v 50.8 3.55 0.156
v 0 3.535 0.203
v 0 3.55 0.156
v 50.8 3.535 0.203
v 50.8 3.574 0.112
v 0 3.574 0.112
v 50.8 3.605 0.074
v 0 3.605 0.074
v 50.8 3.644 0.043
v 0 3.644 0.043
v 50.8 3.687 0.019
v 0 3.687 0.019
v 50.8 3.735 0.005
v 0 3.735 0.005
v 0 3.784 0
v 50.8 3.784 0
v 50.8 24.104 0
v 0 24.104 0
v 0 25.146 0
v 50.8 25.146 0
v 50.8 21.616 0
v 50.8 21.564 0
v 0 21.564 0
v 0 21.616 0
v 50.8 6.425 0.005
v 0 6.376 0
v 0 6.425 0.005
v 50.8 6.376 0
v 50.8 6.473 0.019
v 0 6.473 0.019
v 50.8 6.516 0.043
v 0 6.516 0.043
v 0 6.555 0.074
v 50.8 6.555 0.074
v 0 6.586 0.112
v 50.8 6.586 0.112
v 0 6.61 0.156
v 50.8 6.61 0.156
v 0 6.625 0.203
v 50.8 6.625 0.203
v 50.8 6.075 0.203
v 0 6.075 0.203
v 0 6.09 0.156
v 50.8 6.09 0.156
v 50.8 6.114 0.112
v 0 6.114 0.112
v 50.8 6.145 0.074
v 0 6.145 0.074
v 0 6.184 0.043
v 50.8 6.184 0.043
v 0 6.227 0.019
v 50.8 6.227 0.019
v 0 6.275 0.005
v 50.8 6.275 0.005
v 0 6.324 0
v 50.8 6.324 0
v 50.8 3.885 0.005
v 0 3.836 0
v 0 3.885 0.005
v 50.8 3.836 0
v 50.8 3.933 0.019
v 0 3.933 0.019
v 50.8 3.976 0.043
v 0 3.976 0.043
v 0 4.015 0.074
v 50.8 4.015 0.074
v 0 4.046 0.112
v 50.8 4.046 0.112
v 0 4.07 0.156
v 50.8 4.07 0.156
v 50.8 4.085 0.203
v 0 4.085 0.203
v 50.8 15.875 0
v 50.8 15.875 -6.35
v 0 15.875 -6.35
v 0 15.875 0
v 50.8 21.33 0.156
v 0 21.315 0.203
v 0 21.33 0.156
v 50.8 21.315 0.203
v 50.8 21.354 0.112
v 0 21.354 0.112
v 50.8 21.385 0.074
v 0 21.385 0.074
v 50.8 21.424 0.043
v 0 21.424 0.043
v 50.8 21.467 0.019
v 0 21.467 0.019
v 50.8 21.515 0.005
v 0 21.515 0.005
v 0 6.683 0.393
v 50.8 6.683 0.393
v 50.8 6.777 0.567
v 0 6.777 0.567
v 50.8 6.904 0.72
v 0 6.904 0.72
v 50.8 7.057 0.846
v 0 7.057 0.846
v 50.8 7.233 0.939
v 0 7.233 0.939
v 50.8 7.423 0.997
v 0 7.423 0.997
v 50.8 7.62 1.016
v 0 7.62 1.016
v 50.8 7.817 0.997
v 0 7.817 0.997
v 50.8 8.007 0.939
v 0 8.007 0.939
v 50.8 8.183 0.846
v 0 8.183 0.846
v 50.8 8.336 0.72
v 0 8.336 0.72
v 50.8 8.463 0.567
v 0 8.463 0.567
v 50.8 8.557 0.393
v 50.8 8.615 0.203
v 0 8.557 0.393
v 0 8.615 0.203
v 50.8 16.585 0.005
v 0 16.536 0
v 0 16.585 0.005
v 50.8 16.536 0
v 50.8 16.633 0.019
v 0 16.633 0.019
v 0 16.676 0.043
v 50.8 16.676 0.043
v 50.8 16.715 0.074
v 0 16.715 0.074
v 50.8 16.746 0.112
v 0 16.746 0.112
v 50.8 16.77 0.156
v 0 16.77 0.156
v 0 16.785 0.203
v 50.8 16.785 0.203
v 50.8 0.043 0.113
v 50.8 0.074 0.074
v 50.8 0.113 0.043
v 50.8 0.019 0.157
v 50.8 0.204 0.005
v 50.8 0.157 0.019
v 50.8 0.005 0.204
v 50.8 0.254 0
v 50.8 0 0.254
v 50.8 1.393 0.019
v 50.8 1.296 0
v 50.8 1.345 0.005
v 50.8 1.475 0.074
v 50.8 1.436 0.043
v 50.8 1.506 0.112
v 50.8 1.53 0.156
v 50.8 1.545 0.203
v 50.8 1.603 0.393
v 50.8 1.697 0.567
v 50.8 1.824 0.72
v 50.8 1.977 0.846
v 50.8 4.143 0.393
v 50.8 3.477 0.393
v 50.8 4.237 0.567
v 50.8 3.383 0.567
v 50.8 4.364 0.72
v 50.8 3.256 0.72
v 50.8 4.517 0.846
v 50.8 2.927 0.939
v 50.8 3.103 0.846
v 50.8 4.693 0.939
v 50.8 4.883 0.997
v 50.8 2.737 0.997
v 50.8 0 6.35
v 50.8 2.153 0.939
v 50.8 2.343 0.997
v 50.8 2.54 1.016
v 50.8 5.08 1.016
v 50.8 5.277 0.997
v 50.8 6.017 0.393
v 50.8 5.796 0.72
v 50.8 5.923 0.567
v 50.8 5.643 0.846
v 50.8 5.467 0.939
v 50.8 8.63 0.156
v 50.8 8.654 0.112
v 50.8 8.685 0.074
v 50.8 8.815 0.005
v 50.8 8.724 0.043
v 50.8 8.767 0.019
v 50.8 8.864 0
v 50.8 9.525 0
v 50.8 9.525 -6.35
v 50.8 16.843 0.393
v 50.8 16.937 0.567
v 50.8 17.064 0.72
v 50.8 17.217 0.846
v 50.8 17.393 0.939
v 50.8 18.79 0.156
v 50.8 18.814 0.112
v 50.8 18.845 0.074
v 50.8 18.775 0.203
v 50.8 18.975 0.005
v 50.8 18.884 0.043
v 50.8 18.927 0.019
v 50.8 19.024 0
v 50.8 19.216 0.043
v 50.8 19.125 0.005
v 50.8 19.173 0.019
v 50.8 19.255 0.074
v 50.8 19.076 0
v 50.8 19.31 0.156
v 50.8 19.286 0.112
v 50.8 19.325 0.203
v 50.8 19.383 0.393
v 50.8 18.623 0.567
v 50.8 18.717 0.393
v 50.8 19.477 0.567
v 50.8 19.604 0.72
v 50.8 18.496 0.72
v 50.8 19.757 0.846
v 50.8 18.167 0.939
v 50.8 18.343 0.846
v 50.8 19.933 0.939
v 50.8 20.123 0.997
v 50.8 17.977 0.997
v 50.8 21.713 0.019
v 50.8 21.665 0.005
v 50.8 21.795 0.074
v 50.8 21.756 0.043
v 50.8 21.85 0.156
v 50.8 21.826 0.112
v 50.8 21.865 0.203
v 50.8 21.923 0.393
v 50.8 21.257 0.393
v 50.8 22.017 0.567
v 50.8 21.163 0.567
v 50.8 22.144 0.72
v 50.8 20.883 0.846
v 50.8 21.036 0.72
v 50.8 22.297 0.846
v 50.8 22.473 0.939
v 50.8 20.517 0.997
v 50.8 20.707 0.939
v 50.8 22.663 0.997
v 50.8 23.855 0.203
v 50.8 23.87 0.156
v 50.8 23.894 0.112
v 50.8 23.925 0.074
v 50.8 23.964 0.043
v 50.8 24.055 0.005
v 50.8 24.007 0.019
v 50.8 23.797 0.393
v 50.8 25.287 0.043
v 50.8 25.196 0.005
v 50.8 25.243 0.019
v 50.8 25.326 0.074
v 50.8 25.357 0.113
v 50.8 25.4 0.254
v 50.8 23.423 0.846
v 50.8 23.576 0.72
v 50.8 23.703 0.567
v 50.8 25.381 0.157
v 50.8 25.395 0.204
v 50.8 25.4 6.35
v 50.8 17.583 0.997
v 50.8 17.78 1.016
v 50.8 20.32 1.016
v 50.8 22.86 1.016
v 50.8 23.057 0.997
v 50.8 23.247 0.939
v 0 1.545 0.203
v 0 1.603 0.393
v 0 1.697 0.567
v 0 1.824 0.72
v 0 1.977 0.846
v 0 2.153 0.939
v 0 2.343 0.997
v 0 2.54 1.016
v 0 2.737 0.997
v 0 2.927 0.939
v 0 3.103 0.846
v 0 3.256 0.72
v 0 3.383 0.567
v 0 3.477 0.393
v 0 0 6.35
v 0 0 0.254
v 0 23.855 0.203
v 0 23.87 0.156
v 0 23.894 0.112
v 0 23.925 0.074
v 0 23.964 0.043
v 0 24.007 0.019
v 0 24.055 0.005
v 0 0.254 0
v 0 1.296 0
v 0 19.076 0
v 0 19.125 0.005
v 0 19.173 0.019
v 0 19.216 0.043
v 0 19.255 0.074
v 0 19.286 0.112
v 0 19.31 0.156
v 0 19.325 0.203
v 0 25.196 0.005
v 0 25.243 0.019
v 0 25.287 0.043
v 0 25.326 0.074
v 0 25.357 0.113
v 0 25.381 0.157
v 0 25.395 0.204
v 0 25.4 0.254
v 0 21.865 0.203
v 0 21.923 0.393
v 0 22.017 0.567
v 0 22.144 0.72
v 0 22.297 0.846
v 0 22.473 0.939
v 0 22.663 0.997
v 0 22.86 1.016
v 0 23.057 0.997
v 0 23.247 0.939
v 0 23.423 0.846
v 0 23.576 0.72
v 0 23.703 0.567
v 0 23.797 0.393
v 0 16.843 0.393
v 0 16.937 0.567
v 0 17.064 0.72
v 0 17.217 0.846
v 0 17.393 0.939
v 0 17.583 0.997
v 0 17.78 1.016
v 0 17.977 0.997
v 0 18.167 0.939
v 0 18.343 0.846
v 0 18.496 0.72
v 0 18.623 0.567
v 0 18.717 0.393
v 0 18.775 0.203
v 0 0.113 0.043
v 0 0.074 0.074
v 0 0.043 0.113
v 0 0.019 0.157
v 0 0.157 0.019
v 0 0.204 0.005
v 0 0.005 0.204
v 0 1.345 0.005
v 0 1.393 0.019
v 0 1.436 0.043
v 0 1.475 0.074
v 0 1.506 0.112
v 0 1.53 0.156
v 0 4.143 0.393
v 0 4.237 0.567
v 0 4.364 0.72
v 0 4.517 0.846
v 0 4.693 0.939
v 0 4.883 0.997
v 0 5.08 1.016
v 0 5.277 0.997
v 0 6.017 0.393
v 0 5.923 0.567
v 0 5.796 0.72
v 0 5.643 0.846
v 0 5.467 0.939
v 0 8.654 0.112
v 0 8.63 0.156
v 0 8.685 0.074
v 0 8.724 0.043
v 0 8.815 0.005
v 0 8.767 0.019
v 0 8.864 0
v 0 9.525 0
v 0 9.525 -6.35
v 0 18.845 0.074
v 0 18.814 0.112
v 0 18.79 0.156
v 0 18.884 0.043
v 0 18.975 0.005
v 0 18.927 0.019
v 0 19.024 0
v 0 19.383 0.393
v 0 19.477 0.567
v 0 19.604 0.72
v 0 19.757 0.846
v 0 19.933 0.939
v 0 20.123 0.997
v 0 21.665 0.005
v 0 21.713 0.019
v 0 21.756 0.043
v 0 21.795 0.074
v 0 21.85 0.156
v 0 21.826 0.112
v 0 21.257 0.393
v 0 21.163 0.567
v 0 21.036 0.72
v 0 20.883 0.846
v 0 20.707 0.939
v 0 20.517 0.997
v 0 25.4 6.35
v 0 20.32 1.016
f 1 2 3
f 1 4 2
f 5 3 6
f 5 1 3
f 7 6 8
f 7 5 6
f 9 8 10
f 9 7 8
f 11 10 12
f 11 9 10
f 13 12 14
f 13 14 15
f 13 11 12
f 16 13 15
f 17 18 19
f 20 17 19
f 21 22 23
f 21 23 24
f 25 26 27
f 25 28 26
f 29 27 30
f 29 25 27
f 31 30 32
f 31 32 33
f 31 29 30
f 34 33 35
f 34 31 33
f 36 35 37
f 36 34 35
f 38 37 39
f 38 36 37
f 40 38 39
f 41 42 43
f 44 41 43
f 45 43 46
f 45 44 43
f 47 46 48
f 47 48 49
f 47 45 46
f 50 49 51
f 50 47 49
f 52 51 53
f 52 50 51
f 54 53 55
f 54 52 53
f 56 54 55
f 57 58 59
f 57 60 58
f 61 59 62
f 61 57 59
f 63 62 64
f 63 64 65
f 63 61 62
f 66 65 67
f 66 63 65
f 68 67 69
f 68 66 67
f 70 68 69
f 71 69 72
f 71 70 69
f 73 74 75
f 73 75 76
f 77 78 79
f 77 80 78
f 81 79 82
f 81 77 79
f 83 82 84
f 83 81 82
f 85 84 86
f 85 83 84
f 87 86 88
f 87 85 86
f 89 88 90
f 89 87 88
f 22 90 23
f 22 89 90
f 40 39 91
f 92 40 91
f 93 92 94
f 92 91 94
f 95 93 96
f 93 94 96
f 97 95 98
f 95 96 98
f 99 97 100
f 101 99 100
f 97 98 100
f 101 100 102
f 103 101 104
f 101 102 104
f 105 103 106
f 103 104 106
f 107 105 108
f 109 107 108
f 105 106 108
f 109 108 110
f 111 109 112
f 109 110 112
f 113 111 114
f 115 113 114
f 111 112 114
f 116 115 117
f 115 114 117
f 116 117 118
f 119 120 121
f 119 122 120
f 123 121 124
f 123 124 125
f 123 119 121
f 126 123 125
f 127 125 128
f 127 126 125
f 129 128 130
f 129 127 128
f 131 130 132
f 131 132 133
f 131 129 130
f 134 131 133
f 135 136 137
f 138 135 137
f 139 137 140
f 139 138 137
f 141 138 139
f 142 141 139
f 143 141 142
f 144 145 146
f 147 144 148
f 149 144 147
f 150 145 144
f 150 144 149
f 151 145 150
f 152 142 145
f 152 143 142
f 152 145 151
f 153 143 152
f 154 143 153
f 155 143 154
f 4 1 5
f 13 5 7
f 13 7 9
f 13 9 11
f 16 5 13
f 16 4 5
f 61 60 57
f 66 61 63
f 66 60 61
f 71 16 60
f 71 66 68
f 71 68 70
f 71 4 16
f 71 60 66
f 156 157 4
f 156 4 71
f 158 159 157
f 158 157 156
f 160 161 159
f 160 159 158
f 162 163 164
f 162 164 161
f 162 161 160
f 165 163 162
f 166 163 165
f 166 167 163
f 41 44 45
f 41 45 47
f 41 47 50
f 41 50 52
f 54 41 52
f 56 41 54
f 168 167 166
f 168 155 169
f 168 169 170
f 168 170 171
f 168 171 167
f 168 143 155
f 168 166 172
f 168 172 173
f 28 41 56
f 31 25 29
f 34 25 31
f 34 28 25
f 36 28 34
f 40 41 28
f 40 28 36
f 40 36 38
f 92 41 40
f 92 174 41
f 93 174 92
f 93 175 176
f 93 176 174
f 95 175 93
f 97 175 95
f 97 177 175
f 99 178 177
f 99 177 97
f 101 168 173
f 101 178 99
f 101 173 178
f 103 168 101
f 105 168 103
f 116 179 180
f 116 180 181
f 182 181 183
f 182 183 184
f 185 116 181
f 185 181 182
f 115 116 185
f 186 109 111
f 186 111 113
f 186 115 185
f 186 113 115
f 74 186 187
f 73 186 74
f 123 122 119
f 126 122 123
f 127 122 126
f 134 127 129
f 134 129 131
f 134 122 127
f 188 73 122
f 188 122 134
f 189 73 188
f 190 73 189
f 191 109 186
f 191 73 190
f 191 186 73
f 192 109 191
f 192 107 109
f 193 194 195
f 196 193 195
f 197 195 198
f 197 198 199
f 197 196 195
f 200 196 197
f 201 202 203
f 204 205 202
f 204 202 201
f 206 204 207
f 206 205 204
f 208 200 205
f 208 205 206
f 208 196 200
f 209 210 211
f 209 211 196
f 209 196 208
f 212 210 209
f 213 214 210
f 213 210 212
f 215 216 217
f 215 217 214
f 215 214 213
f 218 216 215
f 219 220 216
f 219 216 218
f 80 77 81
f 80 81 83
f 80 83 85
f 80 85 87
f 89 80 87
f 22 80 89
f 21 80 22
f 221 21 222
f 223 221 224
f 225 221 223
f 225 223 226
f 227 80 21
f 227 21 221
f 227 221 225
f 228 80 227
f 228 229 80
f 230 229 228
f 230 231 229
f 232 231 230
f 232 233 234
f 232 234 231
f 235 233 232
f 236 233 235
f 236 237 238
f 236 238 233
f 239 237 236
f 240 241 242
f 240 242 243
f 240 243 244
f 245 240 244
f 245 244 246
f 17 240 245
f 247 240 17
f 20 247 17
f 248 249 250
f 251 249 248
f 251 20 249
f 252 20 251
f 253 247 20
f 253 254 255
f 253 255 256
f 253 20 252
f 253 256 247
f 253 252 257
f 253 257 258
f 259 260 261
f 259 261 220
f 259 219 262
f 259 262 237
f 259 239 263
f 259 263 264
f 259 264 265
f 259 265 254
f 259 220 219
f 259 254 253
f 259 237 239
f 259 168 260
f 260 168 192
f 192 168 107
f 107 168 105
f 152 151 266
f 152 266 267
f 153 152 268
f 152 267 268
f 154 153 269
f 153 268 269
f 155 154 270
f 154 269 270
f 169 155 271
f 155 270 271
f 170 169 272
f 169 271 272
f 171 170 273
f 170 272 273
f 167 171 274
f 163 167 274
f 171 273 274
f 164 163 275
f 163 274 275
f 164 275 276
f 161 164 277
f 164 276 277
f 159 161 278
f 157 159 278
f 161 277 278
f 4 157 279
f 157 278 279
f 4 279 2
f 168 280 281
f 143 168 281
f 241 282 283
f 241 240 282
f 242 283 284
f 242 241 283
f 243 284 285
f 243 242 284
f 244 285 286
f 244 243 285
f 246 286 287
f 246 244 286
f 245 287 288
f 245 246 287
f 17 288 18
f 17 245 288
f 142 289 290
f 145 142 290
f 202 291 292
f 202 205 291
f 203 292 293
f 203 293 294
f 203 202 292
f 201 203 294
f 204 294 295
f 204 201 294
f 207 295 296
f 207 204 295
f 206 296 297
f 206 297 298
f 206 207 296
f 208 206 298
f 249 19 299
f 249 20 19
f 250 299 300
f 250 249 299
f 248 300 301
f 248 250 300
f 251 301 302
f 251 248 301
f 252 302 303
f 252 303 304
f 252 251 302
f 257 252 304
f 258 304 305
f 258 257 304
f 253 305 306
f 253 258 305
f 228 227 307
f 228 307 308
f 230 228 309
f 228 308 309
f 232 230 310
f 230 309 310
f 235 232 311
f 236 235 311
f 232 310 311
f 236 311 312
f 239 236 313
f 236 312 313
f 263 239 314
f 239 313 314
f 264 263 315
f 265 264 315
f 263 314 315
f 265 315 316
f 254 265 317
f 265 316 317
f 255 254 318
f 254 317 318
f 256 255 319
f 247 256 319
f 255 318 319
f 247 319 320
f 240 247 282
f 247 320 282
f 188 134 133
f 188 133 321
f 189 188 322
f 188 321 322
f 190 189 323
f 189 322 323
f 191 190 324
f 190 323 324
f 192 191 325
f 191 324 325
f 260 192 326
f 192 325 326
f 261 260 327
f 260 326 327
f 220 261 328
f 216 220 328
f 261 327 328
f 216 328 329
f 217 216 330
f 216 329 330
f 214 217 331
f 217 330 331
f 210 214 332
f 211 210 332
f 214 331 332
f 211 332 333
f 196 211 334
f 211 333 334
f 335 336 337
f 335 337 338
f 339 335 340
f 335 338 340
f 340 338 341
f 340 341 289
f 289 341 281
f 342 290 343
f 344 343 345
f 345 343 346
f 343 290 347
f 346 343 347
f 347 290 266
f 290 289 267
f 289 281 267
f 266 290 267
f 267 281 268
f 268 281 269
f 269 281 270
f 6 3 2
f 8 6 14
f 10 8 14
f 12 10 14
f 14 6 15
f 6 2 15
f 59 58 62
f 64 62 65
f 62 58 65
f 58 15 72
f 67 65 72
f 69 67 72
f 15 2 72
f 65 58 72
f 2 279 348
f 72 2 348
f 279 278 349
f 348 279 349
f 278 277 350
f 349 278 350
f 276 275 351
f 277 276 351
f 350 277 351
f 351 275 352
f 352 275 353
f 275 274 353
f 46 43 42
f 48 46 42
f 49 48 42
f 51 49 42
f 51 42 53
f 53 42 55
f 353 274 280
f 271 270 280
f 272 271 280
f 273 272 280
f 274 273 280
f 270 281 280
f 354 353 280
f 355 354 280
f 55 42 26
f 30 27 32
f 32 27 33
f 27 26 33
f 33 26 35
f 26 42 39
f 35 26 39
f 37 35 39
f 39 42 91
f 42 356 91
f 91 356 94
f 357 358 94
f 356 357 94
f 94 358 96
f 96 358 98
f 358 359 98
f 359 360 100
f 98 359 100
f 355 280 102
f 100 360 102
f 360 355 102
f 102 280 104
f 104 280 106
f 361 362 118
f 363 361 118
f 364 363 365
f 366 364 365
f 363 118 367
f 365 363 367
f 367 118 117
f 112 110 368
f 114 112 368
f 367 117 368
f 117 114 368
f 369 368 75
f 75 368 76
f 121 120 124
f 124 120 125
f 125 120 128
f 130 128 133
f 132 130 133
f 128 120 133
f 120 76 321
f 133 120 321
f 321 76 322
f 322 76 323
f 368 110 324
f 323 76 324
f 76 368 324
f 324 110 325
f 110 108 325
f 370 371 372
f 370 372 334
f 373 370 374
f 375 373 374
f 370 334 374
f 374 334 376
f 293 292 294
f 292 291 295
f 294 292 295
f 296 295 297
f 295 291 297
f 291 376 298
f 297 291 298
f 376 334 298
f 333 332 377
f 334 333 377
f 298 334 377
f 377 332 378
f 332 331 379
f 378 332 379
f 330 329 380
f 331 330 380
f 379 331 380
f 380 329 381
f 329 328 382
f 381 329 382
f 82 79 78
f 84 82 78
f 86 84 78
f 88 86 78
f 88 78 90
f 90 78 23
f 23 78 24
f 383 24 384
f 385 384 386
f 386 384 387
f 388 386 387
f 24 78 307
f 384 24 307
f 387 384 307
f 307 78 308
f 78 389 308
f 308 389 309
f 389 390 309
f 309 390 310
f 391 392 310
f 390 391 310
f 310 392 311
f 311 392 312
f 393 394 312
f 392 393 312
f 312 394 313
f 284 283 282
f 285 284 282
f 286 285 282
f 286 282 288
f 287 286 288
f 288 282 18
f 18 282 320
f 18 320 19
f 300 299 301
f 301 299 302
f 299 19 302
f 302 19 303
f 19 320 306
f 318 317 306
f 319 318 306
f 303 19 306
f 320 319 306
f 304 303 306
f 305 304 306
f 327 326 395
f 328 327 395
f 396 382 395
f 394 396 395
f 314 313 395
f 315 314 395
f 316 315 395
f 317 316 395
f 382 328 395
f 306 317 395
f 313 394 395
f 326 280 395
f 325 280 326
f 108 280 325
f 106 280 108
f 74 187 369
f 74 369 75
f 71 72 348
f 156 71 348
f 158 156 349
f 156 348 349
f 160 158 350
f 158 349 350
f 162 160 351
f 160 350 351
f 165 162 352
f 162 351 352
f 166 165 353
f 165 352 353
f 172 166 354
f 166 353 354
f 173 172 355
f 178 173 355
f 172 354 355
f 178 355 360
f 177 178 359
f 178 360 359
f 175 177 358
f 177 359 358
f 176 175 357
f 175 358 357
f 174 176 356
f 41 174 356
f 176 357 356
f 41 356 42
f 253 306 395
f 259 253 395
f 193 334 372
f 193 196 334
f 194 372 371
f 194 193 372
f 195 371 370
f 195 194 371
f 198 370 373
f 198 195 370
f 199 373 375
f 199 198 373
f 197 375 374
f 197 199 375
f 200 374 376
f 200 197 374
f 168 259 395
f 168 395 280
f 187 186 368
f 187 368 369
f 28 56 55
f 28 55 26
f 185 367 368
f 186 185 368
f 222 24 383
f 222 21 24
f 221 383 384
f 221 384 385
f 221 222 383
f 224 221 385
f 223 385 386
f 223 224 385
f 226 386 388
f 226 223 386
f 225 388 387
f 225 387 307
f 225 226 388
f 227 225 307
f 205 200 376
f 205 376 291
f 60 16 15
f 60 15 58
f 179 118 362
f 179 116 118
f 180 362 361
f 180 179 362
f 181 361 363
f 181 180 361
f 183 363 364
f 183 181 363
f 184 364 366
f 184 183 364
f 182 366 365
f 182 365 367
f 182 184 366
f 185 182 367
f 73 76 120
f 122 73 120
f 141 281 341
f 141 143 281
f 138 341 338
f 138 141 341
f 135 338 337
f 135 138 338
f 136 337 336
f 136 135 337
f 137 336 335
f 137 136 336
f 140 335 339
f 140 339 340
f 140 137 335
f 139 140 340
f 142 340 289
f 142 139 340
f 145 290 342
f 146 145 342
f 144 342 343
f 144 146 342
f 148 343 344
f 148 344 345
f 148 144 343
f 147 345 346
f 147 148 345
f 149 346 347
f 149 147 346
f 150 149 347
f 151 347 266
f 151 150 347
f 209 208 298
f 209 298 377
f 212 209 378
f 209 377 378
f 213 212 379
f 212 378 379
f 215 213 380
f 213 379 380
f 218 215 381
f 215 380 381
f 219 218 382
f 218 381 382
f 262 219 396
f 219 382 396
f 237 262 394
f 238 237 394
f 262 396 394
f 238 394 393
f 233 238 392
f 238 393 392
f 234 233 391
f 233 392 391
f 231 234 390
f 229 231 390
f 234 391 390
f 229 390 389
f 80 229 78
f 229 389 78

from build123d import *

# Parameters (mm, degrees)
F1_DEPTH = 50.8
F2_R     = 0.254


with BuildPart() as f1:
    # F0 (on Right) → F1 (new body)
    with BuildSketch(Plane.YZ):
        with BuildLine():
            Line((0, 6.35), (0, 0))
            Line((0, 0), (1.524, 0))
            ThreePointArc((1.524, 0), (2.54, 1.016), (3.556, 0))
            Line((3.556, 0), (4.064, 0))
            ThreePointArc((4.064, 0), (5.08, 1.016), (6.096, 0))
            Line((6.096, 0), (6.604, 0))
            ThreePointArc((6.604, 0), (7.62, 1.016), (8.636, 0))
            Line((8.636, 0), (9.525, 0))
            Line((9.525, 0), (9.525, -6.35))
            Line((9.525, -6.35), (15.875, -6.35))
            Line((15.875, -6.35), (15.875, 0))
            Line((15.875, 0), (16.764, 0))
            ThreePointArc((16.764, 0), (17.78, 1.016), (18.796, 0))
            Line((18.796, 0), (19.304, 0))
            ThreePointArc((19.304, 0), (20.32, 1.016), (21.336, 0))
            Line((21.336, 0), (21.844, 0))
            ThreePointArc((21.844, 0), (22.86, 1.016), (23.876, 0))
            Line((23.876, 0), (25.4, 0))
            Line((25.4, 0), (25.4, 6.35))
            Line((25.4, 6.35), (0, 6.35))
        make_face()
    extrude(amount=F1_DEPTH)

    # F2
    f2_edges = [f1.edges().sort_by_distance(p)[0] for p in [
        (25.4, 23.876, 0),
        (25.4, 25.4, 0),
        (25.4, 21.336, 0),
        (25.4, 18.796, 0),
        (25.4, 6.604, 0),
        (25.4, 4.064, 0),
        (25.4, 1.524, 0),
        (25.4, 0, 0),
        (25.4, 3.556, 0),
        (25.4, 6.096, 0),
        (25.4, 8.636, 0),
        (25.4, 16.764, 0),
        (25.4, 19.304, 0),
        (25.4, 21.844, 0),
    ]]
    fillet(f2_edges, radius=F2_R)


solid = f1.part
